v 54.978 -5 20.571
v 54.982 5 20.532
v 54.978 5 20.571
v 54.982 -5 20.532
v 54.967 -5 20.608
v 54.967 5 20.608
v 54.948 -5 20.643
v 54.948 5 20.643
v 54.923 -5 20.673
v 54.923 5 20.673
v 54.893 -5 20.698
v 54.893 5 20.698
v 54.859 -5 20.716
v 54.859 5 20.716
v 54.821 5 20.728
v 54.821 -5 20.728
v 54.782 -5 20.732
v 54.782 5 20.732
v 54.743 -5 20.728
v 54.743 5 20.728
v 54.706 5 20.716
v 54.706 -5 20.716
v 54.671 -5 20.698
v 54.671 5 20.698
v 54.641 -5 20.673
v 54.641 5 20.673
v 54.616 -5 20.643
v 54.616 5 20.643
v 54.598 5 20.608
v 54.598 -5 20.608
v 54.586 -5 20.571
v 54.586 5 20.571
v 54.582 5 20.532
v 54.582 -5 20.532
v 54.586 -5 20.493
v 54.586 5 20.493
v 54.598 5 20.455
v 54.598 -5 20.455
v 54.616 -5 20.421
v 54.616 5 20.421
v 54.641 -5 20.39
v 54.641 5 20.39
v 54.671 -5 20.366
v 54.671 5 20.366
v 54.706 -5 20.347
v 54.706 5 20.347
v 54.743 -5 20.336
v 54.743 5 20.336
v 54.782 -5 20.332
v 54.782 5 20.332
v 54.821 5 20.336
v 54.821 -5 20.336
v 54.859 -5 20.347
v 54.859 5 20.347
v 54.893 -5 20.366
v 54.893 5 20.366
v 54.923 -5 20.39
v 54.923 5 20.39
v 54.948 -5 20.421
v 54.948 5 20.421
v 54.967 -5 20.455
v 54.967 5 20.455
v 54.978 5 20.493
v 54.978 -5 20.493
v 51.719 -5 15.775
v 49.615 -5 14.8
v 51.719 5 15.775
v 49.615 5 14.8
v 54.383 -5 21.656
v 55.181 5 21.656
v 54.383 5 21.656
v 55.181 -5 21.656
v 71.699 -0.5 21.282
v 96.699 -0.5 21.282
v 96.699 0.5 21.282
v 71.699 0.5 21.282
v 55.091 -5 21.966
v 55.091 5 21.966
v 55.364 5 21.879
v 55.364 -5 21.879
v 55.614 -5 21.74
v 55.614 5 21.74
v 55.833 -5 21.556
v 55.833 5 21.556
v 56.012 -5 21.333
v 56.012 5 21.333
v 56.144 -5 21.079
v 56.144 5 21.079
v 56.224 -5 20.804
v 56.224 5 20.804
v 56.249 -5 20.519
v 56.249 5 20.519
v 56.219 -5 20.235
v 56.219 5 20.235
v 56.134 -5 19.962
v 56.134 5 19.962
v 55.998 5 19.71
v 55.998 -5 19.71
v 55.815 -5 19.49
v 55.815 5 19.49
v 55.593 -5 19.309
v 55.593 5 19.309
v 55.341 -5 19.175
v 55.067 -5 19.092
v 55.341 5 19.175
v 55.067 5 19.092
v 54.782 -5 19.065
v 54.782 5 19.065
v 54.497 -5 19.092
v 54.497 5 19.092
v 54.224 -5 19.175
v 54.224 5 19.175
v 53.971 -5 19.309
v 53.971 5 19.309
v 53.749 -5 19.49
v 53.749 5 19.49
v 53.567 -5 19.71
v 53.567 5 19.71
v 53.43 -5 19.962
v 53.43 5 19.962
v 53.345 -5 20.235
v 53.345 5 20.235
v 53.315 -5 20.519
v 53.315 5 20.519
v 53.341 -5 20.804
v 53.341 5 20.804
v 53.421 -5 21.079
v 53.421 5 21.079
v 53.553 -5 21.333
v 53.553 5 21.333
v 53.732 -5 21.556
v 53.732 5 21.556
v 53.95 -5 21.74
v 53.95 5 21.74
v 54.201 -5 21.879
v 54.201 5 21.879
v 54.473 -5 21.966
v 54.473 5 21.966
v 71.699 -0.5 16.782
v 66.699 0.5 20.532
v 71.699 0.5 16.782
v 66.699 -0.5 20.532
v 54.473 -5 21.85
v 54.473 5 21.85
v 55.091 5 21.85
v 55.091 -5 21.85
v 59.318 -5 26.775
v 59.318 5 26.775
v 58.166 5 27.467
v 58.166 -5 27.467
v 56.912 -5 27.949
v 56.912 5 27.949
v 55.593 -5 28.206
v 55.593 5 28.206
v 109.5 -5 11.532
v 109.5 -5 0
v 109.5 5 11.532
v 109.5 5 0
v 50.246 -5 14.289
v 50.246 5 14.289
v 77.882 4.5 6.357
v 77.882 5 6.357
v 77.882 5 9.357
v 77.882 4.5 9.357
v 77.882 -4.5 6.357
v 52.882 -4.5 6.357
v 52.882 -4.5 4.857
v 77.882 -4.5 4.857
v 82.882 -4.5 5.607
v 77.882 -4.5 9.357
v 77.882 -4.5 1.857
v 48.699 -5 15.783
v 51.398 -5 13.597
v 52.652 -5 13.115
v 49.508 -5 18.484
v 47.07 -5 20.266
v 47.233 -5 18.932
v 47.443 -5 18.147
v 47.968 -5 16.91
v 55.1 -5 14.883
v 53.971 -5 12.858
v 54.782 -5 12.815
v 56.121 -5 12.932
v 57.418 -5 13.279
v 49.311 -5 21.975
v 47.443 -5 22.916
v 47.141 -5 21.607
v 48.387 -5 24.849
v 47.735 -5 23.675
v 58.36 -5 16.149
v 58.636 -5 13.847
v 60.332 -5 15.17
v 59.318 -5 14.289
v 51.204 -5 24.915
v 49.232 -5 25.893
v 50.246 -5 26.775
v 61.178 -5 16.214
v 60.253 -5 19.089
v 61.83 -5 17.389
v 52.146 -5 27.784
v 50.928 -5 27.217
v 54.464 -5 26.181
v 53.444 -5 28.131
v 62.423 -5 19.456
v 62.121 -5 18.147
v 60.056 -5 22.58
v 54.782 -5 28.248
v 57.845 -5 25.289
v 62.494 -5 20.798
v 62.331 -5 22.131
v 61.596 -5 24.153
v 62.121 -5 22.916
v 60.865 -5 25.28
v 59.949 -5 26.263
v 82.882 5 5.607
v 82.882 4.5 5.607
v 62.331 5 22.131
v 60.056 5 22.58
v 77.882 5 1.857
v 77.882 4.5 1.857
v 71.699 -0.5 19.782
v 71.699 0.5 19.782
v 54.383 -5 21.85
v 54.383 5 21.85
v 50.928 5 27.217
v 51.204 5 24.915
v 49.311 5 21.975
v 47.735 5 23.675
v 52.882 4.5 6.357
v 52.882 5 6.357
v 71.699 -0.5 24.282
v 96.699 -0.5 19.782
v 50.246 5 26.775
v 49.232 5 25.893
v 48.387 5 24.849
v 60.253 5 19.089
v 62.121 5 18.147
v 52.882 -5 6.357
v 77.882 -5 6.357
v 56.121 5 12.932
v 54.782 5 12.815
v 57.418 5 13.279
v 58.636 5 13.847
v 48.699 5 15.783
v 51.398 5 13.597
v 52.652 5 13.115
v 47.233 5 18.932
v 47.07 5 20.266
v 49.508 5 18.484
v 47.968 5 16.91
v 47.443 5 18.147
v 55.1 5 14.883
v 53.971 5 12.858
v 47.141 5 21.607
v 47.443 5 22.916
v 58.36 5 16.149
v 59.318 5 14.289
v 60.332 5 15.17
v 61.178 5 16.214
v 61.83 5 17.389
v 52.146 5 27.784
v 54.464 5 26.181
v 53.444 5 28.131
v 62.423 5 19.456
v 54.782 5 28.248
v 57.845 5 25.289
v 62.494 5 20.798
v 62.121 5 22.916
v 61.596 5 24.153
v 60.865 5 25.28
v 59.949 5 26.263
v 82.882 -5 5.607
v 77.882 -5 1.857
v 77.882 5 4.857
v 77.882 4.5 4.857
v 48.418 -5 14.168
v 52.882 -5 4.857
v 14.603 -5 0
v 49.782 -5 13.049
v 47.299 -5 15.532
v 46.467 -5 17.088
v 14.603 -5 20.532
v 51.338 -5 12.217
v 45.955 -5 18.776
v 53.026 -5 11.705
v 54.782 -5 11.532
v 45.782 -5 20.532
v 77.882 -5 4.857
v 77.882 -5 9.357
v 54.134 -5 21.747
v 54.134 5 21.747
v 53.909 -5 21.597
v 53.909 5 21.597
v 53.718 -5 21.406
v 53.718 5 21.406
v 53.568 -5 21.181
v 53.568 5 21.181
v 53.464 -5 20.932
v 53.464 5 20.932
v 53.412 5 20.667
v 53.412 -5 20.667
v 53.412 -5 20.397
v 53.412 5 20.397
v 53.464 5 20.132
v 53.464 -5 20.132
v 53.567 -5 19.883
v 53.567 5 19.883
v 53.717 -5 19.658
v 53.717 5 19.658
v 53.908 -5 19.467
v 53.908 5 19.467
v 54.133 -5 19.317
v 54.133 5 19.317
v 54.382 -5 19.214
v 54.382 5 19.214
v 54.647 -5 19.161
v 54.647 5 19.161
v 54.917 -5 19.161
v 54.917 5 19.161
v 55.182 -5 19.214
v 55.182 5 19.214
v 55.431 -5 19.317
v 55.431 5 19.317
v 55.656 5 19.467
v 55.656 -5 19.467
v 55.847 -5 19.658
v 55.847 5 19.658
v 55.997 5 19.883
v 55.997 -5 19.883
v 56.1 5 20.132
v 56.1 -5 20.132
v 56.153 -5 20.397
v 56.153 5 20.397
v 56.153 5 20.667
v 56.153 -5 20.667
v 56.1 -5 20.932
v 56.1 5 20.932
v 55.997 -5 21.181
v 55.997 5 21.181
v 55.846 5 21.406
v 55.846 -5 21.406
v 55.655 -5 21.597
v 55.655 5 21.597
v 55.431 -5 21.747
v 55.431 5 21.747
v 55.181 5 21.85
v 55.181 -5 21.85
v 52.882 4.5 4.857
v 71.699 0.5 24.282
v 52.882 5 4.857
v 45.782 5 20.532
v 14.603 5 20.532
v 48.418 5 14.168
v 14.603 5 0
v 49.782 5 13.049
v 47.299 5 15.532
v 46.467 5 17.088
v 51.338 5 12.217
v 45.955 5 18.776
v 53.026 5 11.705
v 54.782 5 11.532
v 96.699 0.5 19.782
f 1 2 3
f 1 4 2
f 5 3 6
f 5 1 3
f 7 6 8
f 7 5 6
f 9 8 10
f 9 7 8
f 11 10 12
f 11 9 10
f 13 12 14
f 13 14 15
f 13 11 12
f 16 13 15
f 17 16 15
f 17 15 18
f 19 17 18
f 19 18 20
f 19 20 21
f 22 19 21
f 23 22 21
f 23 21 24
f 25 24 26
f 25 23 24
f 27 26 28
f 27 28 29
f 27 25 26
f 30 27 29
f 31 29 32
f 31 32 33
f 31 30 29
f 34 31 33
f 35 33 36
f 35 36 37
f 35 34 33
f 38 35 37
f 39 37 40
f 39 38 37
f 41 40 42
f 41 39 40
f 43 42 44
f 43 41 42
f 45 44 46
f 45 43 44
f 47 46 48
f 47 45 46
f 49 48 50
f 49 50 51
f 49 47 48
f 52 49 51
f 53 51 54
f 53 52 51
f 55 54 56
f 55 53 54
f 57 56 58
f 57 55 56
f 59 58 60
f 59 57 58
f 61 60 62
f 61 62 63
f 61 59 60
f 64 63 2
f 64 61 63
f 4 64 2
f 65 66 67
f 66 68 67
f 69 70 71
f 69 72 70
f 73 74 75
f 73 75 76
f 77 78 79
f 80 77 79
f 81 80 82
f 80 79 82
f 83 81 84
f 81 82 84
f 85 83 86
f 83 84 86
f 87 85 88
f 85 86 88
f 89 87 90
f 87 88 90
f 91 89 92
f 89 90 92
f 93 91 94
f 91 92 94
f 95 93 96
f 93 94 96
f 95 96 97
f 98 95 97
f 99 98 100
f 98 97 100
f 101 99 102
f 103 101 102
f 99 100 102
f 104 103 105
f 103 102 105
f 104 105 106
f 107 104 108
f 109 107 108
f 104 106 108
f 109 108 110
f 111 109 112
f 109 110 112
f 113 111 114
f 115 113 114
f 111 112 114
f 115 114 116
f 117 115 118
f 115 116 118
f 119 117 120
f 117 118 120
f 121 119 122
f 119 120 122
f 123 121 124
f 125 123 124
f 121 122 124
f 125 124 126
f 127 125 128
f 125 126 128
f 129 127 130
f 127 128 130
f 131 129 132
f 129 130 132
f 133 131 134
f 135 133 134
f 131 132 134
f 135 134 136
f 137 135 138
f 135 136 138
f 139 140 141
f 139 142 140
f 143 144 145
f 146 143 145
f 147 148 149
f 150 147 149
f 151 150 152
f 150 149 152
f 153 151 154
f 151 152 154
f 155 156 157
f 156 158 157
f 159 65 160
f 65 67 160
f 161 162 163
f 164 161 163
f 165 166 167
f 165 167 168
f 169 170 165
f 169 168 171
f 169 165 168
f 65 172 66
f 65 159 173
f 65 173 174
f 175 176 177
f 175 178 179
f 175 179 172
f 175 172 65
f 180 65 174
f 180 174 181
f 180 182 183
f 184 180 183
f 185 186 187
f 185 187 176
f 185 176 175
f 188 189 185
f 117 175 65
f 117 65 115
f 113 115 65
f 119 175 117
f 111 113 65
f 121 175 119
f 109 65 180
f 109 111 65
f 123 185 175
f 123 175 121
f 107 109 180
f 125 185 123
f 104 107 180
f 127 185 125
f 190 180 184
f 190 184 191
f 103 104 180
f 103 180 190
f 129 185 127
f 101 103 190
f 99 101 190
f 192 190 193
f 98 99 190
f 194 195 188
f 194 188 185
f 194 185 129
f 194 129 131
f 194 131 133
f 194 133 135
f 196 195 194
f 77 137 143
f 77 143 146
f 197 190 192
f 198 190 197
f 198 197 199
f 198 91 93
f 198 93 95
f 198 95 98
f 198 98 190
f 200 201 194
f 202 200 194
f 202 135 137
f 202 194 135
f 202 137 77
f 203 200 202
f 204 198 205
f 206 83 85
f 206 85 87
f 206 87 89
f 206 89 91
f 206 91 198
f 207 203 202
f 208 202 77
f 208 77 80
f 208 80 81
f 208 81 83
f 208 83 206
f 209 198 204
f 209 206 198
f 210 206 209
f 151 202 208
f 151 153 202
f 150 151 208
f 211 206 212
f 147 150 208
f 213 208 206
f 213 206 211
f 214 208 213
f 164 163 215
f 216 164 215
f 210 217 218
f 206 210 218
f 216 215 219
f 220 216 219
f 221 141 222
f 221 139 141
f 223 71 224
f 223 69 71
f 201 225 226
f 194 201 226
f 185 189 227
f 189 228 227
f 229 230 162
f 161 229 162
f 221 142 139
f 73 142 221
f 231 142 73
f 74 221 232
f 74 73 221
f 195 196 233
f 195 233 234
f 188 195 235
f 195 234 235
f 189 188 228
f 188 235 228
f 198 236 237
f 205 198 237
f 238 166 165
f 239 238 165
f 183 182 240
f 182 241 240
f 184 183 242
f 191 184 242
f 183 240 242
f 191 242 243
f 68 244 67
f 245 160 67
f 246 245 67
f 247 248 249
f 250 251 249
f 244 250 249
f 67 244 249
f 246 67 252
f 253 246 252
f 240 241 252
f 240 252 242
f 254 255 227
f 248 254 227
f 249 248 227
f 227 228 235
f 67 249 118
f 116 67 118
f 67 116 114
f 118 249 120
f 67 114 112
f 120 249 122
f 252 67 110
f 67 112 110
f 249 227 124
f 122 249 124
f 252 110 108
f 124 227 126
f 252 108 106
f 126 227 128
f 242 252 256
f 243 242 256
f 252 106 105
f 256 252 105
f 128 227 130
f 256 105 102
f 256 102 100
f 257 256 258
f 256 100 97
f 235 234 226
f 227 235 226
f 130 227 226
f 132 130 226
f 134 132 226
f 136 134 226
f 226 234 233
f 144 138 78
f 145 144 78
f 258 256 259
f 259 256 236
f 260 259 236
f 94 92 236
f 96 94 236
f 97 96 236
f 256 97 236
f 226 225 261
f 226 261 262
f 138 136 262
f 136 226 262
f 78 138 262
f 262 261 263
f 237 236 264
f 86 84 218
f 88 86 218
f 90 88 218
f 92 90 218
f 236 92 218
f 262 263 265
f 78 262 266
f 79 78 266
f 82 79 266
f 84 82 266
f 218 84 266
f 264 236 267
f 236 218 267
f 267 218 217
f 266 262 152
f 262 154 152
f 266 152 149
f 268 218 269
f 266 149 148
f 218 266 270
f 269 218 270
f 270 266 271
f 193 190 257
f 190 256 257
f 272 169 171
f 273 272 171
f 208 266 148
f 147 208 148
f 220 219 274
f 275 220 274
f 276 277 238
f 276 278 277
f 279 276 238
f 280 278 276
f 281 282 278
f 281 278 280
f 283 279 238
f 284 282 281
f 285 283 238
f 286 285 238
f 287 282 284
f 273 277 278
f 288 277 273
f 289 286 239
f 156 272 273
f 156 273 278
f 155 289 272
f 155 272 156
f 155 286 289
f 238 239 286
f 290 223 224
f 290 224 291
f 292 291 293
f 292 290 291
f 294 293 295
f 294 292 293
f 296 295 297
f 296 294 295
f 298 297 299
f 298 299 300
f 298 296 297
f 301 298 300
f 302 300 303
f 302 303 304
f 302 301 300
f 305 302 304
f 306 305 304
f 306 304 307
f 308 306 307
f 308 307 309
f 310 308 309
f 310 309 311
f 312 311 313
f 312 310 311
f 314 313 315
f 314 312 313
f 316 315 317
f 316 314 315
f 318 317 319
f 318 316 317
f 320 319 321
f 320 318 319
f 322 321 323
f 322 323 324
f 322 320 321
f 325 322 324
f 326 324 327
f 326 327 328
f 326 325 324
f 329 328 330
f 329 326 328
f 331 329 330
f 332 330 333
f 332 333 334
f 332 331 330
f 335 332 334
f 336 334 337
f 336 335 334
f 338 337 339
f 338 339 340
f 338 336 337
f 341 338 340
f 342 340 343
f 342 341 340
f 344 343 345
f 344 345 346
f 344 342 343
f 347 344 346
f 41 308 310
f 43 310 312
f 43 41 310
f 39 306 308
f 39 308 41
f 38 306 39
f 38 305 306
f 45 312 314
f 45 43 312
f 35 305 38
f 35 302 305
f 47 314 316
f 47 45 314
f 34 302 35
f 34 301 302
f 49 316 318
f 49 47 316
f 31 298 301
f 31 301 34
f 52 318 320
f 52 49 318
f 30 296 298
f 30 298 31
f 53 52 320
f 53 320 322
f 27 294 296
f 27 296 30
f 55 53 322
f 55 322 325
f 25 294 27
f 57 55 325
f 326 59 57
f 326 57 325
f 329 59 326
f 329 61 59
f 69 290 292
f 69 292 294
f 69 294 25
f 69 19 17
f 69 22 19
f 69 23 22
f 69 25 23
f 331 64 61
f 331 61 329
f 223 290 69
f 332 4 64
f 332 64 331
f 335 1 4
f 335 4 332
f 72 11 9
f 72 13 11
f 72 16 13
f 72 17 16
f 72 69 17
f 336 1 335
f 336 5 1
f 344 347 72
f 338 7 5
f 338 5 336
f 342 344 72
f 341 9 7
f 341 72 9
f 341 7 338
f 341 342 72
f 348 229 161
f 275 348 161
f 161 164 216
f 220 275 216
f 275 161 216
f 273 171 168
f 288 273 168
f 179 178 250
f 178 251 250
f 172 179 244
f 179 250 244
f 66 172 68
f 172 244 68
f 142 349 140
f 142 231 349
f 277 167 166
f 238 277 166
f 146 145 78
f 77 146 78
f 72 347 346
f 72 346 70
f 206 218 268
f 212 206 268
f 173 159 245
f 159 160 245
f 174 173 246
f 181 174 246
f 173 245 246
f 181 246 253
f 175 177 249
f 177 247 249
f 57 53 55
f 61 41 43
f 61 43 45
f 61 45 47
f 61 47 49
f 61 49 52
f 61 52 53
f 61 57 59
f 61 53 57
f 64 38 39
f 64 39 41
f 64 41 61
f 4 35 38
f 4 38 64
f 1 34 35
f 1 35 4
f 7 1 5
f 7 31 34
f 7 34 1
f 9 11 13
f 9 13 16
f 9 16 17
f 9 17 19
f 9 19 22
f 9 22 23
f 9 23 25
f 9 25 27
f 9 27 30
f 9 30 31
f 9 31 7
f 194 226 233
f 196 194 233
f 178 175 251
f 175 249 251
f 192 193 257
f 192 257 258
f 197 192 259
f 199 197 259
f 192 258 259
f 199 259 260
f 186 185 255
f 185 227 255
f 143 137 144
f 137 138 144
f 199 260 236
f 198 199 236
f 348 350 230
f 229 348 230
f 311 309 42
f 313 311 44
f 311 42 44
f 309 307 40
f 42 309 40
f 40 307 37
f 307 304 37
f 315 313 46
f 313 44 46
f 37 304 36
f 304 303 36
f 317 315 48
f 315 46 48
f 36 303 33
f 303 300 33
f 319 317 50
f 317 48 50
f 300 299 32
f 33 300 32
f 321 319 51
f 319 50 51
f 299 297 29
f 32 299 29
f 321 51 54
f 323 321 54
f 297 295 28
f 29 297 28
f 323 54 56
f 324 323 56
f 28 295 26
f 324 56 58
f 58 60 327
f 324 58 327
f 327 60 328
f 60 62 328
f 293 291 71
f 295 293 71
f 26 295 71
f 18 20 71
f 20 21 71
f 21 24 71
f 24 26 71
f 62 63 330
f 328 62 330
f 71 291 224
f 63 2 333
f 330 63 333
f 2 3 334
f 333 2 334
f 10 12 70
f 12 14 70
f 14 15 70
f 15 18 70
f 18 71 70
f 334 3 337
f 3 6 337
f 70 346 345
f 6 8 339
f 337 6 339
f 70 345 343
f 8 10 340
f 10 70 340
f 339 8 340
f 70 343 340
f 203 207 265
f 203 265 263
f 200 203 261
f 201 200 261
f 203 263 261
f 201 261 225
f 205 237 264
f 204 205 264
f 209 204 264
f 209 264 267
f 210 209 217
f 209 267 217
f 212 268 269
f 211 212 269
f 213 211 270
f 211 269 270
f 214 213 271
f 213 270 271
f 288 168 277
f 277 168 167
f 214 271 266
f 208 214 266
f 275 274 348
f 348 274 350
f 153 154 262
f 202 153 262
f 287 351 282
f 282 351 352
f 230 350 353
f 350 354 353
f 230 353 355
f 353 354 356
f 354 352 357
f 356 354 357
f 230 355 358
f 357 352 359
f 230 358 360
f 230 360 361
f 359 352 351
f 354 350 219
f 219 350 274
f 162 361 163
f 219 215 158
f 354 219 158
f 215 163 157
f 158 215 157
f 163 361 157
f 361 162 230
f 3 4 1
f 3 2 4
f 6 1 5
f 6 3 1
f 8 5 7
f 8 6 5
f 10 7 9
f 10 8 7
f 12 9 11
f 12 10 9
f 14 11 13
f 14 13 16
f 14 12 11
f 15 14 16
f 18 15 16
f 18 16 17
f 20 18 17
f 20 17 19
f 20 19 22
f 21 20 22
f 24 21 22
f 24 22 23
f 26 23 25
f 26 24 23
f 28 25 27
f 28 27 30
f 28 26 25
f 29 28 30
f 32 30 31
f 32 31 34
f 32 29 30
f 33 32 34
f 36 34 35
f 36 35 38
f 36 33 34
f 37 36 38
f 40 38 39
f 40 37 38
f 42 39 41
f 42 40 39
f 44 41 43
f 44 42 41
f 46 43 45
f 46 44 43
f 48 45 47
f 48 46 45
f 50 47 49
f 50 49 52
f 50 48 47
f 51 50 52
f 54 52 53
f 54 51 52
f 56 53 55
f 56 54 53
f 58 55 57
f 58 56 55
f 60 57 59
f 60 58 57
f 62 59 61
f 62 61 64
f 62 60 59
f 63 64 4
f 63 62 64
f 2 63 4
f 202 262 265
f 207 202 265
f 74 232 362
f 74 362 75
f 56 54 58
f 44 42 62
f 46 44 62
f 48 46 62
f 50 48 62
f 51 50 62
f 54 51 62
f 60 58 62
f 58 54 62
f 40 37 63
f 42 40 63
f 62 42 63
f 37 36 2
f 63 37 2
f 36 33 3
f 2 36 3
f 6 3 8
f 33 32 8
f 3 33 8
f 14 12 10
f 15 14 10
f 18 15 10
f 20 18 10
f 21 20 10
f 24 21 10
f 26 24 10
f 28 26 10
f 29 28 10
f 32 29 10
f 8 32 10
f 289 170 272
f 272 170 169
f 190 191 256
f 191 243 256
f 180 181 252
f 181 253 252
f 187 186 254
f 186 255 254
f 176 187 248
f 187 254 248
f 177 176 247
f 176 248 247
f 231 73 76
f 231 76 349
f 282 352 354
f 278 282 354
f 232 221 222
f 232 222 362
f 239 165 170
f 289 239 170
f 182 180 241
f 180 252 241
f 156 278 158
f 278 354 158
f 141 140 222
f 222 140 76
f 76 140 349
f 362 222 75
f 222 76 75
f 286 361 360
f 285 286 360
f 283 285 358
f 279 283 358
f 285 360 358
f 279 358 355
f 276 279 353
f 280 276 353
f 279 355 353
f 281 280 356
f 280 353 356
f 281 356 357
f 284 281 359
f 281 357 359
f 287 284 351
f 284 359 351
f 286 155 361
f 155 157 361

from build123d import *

# Parameters (mm, degrees)
F0_R     = 0.199808
F1_DEPTH = 5
F2_DEPTH = 4.5
F3_DEPTH = 0.5
F4_DEPTH = 5


with BuildPart() as f1:
    # F0 (on Front) → F1 (new body, symmetric)
    with BuildSketch(Plane.XZ):
        with BuildLine():
            Line((14.603343, 20.531734), (14.603343, 0))
            Line((14.603343, 0), (45.782184, 0))
            Line((45.782184, 0), (109.500438, 0))
            Line((109.500438, 0), (109.500438, 11.531734))
            Line((109.500438, 11.531734), (54.782184, 11.531734))
            ThreePointArc((54.782184, 11.531734), (48.418223, 14.167773), (45.782184, 20.531734))
            Line((45.782184, 20.531734), (14.603343, 20.531734))
        make_face()
        Polygon((52.882191, 6.356732), (77.882191, 6.356732), (77.882191, 9.356732), (82.882191, 5.606732), (77.882191, 1.856732), (77.882191, 4.856732), (52.882191, 4.856732), align=None, mode=Mode.SUBTRACT)
        with BuildLine():
            Line((51.204443, 24.914748), (50.246479, 26.774597))
            ThreePointArc((50.246479, 26.774597), (48.786747, 25.389788), (47.734643, 23.67468))
            Line((47.734643, 23.67468), (49.31146, 21.974723))
            Line((49.31146, 21.974723), (47.443259, 22.916296))
            ThreePointArc((47.443259, 22.916296), (47.076282, 20.937952), (47.233226, 18.93199))
            Line((47.233226, 18.93199), (49.508108, 18.483526))
            Line((49.508108, 18.483526), (47.443259, 18.147173))
            ThreePointArc((47.443259, 18.147173), (48.309209, 16.330956), (49.615255, 14.800348))
            Line((49.615255, 14.800348), (51.719274, 15.774675))
            Line((51.719274, 15.774675), (50.246479, 14.288872))
            ThreePointArc((50.246479, 14.288872), (52.014593, 13.328514), (53.970875, 12.857901))
            Line((53.970875, 12.857901), (55.100367, 14.882859))
            Line((55.100367, 14.882859), (54.782184, 12.815132))
            ThreePointArc((54.782184, 12.815132), (56.777103, 13.077457), (58.636388, 13.846597))
            Line((58.636388, 13.846597), (58.359925, 16.148721))
            Line((58.359925, 16.148721), (59.317889, 14.288872))
            ThreePointArc((59.317889, 14.288872), (60.777622, 15.673681), (61.829726, 17.388788))
            Line((61.829726, 17.388788), (60.252908, 19.088746))
            Line((60.252908, 19.088746), (62.121109, 18.147173))
            ThreePointArc((62.121109, 18.147173), (62.488087, 20.125517), (62.331142, 22.131479))
            Line((62.331142, 22.131479), (60.05626, 22.579943))
            Line((60.05626, 22.579943), (62.121109, 22.916296))
            ThreePointArc((62.121109, 22.916296), (61.255159, 24.732513), (59.949114, 26.263121))
            Line((59.949114, 26.263121), (57.845095, 25.288794))
            Line((57.845095, 25.288794), (59.317889, 26.774597))
            ThreePointArc((59.317889, 26.774597), (57.549775, 27.734955), (55.593493, 28.205568))
            Line((55.593493, 28.205568), (54.464001, 26.18061))
            Line((54.464001, 26.18061), (54.782184, 28.248337))
            ThreePointArc((54.782184, 28.248337), (52.787265, 27.986012), (50.927981, 27.216872))
            Line((50.927981, 27.216872), (51.204443, 24.914748))
        make_face()
        with BuildLine():
            Line((54.473073, 21.965987), (54.473073, 21.84982))
            Line((54.473073, 21.84982), (55.091295, 21.84982))
            Line((55.091295, 21.84982), (55.091295, 21.965987))
            ThreePointArc((55.091295, 21.965987), (54.782184, 19.06455), (54.473073, 21.965987))
        make_face(mode=Mode.SUBTRACT)
        with BuildLine():
            Line((54.383074, 21.656128), (54.383074, 21.84982))
            ThreePointArc((54.383074, 21.84982), (54.782184, 19.154549), (55.181295, 21.84982))
            Line((55.181295, 21.84982), (55.181295, 21.656128))
            Line((55.181295, 21.656128), (54.383074, 21.656128))
        make_face()
        with Locations((54.782184, 20.531734)):
            Circle(F0_R, mode=Mode.SUBTRACT)
    extrude(amount=F1_DEPTH, both=True)

    # F0 (on Front) → F2 (join, symmetric)
    with BuildSketch(Plane.XZ):
        Polygon((77.882191, 9.356732), (77.882191, 6.356732), (52.882191, 6.356732), (52.882191, 4.856732), (77.882191, 4.856732), (77.882191, 1.856732), (82.882191, 5.606732), align=None)
    extrude(amount=F2_DEPTH, both=True)


with BuildPart() as f3:
    # F0 (on Front) → F3 (new body, symmetric)
    with BuildSketch(Plane.XZ):
        Polygon((71.698804, 16.781734), (71.698804, 19.781734), (96.698804, 19.781734), (96.698804, 21.281734), (71.698804, 21.281734), (71.698804, 24.281734), (66.698804, 20.531734), align=None)
    extrude(amount=F3_DEPTH, both=True)


with BuildPart() as f4:
    # F0 (on Front) → F4 (new body, symmetric)
    with BuildSketch(Plane.XZ):
        with Locations((54.782184, 20.531734)):
            Circle(F0_R)
    extrude(amount=F4_DEPTH, both=True)


solid = Compound([f1.part, f3.part, f4.part])
